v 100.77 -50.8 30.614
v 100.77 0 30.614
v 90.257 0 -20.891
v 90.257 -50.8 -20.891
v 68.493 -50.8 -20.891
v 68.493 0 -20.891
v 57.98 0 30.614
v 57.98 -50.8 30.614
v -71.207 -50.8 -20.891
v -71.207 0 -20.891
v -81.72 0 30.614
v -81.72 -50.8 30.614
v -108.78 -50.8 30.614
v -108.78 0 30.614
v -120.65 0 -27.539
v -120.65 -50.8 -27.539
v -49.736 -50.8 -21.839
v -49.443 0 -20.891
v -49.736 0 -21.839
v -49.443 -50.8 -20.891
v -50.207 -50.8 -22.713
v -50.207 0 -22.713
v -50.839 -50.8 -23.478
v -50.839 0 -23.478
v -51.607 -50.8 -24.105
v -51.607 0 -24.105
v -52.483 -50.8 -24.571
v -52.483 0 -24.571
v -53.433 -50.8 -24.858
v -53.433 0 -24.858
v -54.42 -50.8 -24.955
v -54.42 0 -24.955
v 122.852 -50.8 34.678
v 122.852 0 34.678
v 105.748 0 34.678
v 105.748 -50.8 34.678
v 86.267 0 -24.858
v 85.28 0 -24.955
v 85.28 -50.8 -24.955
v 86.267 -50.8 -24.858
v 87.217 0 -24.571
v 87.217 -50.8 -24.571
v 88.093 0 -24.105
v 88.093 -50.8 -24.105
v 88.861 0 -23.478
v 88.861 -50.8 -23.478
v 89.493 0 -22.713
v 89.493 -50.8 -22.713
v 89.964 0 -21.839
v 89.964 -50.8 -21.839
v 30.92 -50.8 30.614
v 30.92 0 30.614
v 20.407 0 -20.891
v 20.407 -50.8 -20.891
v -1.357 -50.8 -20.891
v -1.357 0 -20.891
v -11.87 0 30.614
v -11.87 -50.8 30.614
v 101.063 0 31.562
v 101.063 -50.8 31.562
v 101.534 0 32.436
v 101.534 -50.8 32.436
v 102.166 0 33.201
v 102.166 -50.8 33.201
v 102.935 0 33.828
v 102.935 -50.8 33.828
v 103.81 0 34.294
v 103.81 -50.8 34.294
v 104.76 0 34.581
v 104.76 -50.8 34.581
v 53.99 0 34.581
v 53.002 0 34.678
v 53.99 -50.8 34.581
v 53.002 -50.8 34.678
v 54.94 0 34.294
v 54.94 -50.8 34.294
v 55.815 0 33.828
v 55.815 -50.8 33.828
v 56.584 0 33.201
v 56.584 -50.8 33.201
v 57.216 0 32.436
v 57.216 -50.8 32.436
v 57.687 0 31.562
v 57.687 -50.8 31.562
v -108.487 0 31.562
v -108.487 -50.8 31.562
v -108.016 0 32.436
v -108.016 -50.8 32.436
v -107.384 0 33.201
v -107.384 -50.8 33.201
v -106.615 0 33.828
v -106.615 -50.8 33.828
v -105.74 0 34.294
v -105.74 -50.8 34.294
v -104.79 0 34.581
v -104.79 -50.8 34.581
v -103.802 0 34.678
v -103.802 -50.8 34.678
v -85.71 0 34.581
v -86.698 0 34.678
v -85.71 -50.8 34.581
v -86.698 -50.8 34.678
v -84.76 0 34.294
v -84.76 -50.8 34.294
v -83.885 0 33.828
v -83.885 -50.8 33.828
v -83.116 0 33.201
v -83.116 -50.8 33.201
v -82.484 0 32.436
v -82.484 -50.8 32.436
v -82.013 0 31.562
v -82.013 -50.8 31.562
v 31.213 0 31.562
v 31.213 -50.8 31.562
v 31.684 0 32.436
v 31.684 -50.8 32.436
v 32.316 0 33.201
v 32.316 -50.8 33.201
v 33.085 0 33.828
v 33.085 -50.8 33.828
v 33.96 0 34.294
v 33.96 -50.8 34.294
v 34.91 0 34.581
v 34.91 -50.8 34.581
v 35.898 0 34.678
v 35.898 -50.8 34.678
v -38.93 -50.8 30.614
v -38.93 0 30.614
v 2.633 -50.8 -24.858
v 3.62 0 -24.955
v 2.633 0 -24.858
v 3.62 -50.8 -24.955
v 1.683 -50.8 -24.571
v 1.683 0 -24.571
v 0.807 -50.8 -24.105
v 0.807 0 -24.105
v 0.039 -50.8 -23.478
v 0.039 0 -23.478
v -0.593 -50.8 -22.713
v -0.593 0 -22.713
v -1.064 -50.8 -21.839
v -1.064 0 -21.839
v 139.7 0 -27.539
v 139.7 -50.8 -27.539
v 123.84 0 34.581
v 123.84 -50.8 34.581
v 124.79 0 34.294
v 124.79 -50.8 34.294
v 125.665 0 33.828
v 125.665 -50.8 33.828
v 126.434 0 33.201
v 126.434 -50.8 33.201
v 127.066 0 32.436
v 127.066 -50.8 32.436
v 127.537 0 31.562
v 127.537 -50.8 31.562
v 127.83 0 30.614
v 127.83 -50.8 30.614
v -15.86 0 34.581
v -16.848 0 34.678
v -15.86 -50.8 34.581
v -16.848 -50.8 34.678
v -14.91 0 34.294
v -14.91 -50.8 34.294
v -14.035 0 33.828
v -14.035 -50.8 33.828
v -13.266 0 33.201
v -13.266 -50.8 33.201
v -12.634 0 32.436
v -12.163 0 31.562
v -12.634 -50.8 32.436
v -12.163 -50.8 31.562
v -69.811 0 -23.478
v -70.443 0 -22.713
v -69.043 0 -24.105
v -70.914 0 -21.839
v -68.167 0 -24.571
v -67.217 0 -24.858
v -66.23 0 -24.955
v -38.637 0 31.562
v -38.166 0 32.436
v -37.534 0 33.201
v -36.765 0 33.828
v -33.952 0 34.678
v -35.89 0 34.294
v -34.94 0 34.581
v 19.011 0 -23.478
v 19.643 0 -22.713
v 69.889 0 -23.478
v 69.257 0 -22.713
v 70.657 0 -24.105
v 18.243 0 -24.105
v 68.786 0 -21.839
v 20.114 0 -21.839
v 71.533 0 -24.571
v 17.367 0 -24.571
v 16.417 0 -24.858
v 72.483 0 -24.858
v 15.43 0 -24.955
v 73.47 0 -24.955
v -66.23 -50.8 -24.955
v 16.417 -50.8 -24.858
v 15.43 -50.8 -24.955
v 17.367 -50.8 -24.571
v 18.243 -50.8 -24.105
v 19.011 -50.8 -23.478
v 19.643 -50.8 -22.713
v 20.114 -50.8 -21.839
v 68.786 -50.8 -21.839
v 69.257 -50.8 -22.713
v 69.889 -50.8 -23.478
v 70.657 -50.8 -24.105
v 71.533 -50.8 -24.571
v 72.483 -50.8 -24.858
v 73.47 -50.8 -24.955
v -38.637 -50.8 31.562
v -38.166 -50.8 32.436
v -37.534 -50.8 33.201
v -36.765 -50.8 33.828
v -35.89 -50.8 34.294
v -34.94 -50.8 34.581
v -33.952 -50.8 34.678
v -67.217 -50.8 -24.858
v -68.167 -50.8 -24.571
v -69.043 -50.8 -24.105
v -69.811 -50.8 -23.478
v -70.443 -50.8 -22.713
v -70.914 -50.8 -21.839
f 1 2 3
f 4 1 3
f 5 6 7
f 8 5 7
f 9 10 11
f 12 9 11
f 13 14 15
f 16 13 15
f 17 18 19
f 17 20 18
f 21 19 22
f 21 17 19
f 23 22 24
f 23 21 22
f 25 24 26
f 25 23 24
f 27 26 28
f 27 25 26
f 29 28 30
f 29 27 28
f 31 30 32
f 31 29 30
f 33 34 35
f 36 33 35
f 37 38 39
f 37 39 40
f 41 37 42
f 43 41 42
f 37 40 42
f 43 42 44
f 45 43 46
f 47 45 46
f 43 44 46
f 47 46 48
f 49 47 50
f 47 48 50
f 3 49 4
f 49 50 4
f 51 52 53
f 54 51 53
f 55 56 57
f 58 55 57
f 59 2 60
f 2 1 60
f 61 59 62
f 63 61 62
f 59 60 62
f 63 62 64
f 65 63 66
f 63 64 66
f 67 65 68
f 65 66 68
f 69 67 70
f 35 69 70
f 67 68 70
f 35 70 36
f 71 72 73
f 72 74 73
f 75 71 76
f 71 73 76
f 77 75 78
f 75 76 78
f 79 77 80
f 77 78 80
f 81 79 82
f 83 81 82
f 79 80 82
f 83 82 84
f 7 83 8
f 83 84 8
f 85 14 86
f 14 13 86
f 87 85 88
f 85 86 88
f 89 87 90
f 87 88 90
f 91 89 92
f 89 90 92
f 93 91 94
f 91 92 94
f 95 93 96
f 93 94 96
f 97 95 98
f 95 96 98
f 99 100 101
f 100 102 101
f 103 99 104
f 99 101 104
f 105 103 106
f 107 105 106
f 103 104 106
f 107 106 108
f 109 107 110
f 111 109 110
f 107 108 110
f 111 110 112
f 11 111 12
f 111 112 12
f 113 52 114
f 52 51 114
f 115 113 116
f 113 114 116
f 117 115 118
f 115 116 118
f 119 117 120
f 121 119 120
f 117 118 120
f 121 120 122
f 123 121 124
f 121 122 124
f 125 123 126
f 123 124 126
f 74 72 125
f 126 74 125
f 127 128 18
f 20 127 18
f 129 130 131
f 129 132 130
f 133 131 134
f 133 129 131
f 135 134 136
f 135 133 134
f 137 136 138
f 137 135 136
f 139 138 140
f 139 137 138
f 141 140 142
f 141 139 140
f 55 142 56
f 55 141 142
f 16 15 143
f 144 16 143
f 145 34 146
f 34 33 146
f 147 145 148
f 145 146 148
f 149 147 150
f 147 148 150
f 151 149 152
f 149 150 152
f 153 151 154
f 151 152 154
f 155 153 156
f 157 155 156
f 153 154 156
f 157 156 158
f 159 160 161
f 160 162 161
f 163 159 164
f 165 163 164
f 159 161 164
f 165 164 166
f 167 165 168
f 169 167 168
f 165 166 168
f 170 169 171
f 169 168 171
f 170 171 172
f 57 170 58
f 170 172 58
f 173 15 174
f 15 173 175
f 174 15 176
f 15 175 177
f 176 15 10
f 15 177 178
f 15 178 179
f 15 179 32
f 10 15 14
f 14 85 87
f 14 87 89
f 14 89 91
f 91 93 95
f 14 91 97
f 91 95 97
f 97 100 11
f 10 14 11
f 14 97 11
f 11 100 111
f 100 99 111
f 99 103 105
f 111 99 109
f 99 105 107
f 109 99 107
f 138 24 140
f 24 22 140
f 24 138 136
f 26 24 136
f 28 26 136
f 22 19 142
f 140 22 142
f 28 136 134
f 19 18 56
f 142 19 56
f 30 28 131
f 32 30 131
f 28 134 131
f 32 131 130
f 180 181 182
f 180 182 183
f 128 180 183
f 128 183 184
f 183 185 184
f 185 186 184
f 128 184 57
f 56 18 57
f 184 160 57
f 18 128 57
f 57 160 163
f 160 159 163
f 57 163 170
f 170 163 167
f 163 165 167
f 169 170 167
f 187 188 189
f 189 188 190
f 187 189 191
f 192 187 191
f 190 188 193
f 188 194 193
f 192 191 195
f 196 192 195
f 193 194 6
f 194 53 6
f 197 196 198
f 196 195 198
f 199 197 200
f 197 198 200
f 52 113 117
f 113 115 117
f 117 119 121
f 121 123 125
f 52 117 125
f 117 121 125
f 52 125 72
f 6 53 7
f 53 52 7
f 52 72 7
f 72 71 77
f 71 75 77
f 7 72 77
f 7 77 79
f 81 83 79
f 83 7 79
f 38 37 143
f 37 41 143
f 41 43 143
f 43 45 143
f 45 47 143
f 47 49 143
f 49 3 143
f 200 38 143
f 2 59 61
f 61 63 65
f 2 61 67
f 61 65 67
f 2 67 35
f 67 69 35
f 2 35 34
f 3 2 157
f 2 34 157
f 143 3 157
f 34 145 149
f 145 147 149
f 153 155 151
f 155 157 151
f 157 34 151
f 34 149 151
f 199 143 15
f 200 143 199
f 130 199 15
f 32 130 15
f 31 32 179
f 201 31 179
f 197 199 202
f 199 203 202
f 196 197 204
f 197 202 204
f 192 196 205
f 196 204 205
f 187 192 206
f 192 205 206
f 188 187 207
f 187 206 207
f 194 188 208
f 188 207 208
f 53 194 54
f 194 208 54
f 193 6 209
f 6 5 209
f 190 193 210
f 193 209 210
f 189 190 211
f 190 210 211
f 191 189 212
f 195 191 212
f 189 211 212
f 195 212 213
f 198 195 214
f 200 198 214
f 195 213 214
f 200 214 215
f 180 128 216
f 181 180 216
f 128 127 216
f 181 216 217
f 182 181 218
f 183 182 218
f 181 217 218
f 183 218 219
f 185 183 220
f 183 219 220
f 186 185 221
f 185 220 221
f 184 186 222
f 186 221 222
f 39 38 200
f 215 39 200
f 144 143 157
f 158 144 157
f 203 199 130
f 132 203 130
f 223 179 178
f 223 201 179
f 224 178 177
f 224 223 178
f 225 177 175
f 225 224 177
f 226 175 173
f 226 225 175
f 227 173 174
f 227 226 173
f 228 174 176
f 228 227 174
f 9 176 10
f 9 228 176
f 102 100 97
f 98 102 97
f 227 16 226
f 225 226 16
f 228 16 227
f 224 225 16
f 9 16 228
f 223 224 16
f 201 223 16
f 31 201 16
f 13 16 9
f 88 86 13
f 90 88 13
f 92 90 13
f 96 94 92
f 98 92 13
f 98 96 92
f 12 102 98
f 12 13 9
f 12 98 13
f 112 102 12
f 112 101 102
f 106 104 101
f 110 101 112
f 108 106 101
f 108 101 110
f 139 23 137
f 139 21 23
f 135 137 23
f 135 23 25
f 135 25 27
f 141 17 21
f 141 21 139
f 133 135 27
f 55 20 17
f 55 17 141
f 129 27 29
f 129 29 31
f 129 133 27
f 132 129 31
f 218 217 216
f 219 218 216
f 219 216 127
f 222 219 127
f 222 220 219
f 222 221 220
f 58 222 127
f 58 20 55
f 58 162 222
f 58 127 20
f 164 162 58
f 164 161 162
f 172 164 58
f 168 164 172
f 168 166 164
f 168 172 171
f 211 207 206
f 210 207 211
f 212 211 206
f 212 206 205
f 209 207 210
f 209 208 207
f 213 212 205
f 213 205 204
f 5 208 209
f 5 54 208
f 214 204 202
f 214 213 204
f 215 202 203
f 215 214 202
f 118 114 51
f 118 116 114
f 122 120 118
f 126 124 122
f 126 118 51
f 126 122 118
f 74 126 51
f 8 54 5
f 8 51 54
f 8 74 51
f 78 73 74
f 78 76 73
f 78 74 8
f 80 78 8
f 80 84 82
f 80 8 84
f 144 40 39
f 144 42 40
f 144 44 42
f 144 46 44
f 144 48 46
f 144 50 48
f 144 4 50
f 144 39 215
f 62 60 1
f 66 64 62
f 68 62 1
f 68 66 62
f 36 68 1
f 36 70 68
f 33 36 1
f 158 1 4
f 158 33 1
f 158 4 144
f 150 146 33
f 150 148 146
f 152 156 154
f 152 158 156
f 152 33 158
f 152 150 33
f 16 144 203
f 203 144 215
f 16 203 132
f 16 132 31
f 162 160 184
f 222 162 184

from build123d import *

# Parameters (mm, degrees)
F1_DEPTH = 50.8
F2_R     = 5.08
F3_R     = 5.08
F4_R     = 5.08
F5_R     = 5.08
F6_R     = 5.08
F7_R     = 5.08
F8_R     = 5.08
F9_R     = 5.08
F10_R    = 5.08
F11_R    = 5.08
F12_R    = 5.08
F13_R    = 5.08
F14_R    = 5.08
F15_R    = 5.08


with BuildPart() as f1:
    # F0 (on Front) → F1 (new body)
    with BuildSketch(Plane.XZ):
        Polygon((-107.95, 34.678186), (-120.65, -27.538854), (-69.85, -27.538854), (-70.377374, -24.955261), (-82.55, 34.678186), align=None)
        Polygon((-70.377374, -24.955261), (-69.85, -27.538854), (-50.8, -27.538854), (-50.272626, -24.955261), align=None)
        Polygon((-50.272626, -24.955261), (-50.8, -27.538854), (0, -27.538854), (-0.527374, -24.955261), (-12.7, 34.678186), (-38.1, 34.678186), align=None)
        Polygon((-0.527374, -24.955261), (0, -27.538854), (19.05, -27.538854), (19.577374, -24.955261), align=None)
        Polygon((19.577374, -24.955261), (19.05, -27.538854), (69.85, -27.538854), (69.322626, -24.955261), (57.15, 34.678186), (31.75, 34.678186), align=None)
        Polygon((69.322626, -24.955261), (69.85, -27.538854), (88.9, -27.538854), (89.427374, -24.955261), align=None)
        Polygon((89.427374, -24.955261), (88.9, -27.538854), (139.7, -27.538854), (127, 34.678186), (101.6, 34.678186), align=None)
    extrude(amount=F1_DEPTH)

    # F2
    f2_edges = [f1.edges().sort_by_distance(p)[0] for p in [
        (-50.272626, -25.4, -24.955261),
    ]]
    fillet(f2_edges, radius=F2_R)

    # F3
    f3_edges = [f1.edges().sort_by_distance(p)[0] for p in [
        (-70.377374, -25.4, -24.955261),
    ]]
    fillet(f3_edges, radius=F3_R)

    # F4
    f4_edges = [f1.edges().sort_by_distance(p)[0] for p in [
        (19.577374, -25.4, -24.955261),
    ]]
    fillet(f4_edges, radius=F4_R)

    # F5
    f5_edges = [f1.edges().sort_by_distance(p)[0] for p in [
        (-0.527374, -25.4, -24.955261),
    ]]
    fillet(f5_edges, radius=F5_R)

    # F6
    f6_edges = [f1.edges().sort_by_distance(p)[0] for p in [
        (69.322626, -25.4, -24.955261),
    ]]
    fillet(f6_edges, radius=F6_R)

    # F7
    f7_edges = [f1.edges().sort_by_distance(p)[0] for p in [
        (89.427374, -25.4, -24.955261),
    ]]
    fillet(f7_edges, radius=F7_R)

    # F8
    f8_edges = [f1.edges().sort_by_distance(p)[0] for p in [
        (-82.55, -25.4, 34.678186),
    ]]
    fillet(f8_edges, radius=F8_R)

    # F9
    f9_edges = [f1.edges().sort_by_distance(p)[0] for p in [
        (-38.1, -25.4, 34.678186),
    ]]
    fillet(f9_edges, radius=F9_R)

    # F10
    f10_edges = [f1.edges().sort_by_distance(p)[0] for p in [
        (-12.7, -25.4, 34.678186),
    ]]
    fillet(f10_edges, radius=F10_R)

    # F11
    f11_edges = [f1.edges().sort_by_distance(p)[0] for p in [
        (31.75, -25.4, 34.678186),
    ]]
    fillet(f11_edges, radius=F11_R)

    # F12
    f12_edges = [f1.edges().sort_by_distance(p)[0] for p in [
        (57.15, -25.4, 34.678186),
    ]]
    fillet(f12_edges, radius=F12_R)

    # F13
    f13_edges = [f1.edges().sort_by_distance(p)[0] for p in [
        (101.6, -25.4, 34.678186),
    ]]
    fillet(f13_edges, radius=F13_R)

    # F14
    f14_edges = [f1.edges().sort_by_distance(p)[0] for p in [
        (127, -25.4, 34.678186),
    ]]
    fillet(f14_edges, radius=F14_R)

    # F15
    f15_edges = [f1.edges().sort_by_distance(p)[0] for p in [
        (-107.95, -25.4, 34.678186),
    ]]
    fillet(f15_edges, radius=F15_R)


solid = f1.part
